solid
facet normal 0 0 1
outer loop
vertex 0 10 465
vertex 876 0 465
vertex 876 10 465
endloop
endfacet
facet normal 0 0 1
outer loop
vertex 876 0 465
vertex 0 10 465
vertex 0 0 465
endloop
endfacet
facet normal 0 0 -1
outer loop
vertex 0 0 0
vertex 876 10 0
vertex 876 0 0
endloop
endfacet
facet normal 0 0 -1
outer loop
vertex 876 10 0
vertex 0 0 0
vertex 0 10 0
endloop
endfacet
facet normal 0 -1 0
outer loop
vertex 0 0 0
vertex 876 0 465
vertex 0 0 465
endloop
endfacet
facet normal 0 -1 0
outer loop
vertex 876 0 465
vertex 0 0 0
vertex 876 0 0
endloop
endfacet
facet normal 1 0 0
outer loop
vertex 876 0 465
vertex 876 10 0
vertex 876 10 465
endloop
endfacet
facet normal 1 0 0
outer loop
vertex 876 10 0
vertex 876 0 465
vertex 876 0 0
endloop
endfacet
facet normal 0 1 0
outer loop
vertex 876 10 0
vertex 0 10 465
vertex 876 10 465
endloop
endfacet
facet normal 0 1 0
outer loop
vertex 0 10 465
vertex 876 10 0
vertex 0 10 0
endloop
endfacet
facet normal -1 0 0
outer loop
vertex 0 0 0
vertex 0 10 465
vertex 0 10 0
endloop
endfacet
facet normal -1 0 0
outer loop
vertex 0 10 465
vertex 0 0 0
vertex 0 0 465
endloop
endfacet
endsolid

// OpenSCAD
// ============================================================================
// Removable rear panel
//
// Local coordinate system:
// - X: panel width
// - Y: panel thickness, from front face to rear face
// - Z: panel height
// - origin: lower-left corner of the front face
// ============================================================================

/* [Component view] */

component_orientation = "model"; // [model,print]

/* [Rear panel] */

panel_width = 876;
panel_height = 465;
panel_thickness = 10;

curve_segments = 48;
$fn = curve_segments;

module rear_panel(
    width=panel_width,
    height=panel_height,
    thickness=panel_thickness,
    orientation="model"
) {
    assert(width > 0, "Rear-panel width must be positive.");
    assert(height > 0, "Rear-panel height must be positive.");
    assert(thickness > 0, "Rear-panel thickness must be positive.");

    if(orientation=="model")
        rear_panel_geometry(width,height,thickness);
    else if(orientation=="print")
        // Lay the broad face on the print bed.
        rotate([90,0,0])
            rear_panel_geometry(width,height,thickness);
    else
        assert(false,
            "orientation must be model or print.");
}

module rear_panel_geometry(width,height,thickness) {
    color([0.76,0.50,0.27,1])
        cube([width,thickness,height]);
}

rear_panel(
    panel_width,
    panel_height,
    panel_thickness,
    component_orientation
);
